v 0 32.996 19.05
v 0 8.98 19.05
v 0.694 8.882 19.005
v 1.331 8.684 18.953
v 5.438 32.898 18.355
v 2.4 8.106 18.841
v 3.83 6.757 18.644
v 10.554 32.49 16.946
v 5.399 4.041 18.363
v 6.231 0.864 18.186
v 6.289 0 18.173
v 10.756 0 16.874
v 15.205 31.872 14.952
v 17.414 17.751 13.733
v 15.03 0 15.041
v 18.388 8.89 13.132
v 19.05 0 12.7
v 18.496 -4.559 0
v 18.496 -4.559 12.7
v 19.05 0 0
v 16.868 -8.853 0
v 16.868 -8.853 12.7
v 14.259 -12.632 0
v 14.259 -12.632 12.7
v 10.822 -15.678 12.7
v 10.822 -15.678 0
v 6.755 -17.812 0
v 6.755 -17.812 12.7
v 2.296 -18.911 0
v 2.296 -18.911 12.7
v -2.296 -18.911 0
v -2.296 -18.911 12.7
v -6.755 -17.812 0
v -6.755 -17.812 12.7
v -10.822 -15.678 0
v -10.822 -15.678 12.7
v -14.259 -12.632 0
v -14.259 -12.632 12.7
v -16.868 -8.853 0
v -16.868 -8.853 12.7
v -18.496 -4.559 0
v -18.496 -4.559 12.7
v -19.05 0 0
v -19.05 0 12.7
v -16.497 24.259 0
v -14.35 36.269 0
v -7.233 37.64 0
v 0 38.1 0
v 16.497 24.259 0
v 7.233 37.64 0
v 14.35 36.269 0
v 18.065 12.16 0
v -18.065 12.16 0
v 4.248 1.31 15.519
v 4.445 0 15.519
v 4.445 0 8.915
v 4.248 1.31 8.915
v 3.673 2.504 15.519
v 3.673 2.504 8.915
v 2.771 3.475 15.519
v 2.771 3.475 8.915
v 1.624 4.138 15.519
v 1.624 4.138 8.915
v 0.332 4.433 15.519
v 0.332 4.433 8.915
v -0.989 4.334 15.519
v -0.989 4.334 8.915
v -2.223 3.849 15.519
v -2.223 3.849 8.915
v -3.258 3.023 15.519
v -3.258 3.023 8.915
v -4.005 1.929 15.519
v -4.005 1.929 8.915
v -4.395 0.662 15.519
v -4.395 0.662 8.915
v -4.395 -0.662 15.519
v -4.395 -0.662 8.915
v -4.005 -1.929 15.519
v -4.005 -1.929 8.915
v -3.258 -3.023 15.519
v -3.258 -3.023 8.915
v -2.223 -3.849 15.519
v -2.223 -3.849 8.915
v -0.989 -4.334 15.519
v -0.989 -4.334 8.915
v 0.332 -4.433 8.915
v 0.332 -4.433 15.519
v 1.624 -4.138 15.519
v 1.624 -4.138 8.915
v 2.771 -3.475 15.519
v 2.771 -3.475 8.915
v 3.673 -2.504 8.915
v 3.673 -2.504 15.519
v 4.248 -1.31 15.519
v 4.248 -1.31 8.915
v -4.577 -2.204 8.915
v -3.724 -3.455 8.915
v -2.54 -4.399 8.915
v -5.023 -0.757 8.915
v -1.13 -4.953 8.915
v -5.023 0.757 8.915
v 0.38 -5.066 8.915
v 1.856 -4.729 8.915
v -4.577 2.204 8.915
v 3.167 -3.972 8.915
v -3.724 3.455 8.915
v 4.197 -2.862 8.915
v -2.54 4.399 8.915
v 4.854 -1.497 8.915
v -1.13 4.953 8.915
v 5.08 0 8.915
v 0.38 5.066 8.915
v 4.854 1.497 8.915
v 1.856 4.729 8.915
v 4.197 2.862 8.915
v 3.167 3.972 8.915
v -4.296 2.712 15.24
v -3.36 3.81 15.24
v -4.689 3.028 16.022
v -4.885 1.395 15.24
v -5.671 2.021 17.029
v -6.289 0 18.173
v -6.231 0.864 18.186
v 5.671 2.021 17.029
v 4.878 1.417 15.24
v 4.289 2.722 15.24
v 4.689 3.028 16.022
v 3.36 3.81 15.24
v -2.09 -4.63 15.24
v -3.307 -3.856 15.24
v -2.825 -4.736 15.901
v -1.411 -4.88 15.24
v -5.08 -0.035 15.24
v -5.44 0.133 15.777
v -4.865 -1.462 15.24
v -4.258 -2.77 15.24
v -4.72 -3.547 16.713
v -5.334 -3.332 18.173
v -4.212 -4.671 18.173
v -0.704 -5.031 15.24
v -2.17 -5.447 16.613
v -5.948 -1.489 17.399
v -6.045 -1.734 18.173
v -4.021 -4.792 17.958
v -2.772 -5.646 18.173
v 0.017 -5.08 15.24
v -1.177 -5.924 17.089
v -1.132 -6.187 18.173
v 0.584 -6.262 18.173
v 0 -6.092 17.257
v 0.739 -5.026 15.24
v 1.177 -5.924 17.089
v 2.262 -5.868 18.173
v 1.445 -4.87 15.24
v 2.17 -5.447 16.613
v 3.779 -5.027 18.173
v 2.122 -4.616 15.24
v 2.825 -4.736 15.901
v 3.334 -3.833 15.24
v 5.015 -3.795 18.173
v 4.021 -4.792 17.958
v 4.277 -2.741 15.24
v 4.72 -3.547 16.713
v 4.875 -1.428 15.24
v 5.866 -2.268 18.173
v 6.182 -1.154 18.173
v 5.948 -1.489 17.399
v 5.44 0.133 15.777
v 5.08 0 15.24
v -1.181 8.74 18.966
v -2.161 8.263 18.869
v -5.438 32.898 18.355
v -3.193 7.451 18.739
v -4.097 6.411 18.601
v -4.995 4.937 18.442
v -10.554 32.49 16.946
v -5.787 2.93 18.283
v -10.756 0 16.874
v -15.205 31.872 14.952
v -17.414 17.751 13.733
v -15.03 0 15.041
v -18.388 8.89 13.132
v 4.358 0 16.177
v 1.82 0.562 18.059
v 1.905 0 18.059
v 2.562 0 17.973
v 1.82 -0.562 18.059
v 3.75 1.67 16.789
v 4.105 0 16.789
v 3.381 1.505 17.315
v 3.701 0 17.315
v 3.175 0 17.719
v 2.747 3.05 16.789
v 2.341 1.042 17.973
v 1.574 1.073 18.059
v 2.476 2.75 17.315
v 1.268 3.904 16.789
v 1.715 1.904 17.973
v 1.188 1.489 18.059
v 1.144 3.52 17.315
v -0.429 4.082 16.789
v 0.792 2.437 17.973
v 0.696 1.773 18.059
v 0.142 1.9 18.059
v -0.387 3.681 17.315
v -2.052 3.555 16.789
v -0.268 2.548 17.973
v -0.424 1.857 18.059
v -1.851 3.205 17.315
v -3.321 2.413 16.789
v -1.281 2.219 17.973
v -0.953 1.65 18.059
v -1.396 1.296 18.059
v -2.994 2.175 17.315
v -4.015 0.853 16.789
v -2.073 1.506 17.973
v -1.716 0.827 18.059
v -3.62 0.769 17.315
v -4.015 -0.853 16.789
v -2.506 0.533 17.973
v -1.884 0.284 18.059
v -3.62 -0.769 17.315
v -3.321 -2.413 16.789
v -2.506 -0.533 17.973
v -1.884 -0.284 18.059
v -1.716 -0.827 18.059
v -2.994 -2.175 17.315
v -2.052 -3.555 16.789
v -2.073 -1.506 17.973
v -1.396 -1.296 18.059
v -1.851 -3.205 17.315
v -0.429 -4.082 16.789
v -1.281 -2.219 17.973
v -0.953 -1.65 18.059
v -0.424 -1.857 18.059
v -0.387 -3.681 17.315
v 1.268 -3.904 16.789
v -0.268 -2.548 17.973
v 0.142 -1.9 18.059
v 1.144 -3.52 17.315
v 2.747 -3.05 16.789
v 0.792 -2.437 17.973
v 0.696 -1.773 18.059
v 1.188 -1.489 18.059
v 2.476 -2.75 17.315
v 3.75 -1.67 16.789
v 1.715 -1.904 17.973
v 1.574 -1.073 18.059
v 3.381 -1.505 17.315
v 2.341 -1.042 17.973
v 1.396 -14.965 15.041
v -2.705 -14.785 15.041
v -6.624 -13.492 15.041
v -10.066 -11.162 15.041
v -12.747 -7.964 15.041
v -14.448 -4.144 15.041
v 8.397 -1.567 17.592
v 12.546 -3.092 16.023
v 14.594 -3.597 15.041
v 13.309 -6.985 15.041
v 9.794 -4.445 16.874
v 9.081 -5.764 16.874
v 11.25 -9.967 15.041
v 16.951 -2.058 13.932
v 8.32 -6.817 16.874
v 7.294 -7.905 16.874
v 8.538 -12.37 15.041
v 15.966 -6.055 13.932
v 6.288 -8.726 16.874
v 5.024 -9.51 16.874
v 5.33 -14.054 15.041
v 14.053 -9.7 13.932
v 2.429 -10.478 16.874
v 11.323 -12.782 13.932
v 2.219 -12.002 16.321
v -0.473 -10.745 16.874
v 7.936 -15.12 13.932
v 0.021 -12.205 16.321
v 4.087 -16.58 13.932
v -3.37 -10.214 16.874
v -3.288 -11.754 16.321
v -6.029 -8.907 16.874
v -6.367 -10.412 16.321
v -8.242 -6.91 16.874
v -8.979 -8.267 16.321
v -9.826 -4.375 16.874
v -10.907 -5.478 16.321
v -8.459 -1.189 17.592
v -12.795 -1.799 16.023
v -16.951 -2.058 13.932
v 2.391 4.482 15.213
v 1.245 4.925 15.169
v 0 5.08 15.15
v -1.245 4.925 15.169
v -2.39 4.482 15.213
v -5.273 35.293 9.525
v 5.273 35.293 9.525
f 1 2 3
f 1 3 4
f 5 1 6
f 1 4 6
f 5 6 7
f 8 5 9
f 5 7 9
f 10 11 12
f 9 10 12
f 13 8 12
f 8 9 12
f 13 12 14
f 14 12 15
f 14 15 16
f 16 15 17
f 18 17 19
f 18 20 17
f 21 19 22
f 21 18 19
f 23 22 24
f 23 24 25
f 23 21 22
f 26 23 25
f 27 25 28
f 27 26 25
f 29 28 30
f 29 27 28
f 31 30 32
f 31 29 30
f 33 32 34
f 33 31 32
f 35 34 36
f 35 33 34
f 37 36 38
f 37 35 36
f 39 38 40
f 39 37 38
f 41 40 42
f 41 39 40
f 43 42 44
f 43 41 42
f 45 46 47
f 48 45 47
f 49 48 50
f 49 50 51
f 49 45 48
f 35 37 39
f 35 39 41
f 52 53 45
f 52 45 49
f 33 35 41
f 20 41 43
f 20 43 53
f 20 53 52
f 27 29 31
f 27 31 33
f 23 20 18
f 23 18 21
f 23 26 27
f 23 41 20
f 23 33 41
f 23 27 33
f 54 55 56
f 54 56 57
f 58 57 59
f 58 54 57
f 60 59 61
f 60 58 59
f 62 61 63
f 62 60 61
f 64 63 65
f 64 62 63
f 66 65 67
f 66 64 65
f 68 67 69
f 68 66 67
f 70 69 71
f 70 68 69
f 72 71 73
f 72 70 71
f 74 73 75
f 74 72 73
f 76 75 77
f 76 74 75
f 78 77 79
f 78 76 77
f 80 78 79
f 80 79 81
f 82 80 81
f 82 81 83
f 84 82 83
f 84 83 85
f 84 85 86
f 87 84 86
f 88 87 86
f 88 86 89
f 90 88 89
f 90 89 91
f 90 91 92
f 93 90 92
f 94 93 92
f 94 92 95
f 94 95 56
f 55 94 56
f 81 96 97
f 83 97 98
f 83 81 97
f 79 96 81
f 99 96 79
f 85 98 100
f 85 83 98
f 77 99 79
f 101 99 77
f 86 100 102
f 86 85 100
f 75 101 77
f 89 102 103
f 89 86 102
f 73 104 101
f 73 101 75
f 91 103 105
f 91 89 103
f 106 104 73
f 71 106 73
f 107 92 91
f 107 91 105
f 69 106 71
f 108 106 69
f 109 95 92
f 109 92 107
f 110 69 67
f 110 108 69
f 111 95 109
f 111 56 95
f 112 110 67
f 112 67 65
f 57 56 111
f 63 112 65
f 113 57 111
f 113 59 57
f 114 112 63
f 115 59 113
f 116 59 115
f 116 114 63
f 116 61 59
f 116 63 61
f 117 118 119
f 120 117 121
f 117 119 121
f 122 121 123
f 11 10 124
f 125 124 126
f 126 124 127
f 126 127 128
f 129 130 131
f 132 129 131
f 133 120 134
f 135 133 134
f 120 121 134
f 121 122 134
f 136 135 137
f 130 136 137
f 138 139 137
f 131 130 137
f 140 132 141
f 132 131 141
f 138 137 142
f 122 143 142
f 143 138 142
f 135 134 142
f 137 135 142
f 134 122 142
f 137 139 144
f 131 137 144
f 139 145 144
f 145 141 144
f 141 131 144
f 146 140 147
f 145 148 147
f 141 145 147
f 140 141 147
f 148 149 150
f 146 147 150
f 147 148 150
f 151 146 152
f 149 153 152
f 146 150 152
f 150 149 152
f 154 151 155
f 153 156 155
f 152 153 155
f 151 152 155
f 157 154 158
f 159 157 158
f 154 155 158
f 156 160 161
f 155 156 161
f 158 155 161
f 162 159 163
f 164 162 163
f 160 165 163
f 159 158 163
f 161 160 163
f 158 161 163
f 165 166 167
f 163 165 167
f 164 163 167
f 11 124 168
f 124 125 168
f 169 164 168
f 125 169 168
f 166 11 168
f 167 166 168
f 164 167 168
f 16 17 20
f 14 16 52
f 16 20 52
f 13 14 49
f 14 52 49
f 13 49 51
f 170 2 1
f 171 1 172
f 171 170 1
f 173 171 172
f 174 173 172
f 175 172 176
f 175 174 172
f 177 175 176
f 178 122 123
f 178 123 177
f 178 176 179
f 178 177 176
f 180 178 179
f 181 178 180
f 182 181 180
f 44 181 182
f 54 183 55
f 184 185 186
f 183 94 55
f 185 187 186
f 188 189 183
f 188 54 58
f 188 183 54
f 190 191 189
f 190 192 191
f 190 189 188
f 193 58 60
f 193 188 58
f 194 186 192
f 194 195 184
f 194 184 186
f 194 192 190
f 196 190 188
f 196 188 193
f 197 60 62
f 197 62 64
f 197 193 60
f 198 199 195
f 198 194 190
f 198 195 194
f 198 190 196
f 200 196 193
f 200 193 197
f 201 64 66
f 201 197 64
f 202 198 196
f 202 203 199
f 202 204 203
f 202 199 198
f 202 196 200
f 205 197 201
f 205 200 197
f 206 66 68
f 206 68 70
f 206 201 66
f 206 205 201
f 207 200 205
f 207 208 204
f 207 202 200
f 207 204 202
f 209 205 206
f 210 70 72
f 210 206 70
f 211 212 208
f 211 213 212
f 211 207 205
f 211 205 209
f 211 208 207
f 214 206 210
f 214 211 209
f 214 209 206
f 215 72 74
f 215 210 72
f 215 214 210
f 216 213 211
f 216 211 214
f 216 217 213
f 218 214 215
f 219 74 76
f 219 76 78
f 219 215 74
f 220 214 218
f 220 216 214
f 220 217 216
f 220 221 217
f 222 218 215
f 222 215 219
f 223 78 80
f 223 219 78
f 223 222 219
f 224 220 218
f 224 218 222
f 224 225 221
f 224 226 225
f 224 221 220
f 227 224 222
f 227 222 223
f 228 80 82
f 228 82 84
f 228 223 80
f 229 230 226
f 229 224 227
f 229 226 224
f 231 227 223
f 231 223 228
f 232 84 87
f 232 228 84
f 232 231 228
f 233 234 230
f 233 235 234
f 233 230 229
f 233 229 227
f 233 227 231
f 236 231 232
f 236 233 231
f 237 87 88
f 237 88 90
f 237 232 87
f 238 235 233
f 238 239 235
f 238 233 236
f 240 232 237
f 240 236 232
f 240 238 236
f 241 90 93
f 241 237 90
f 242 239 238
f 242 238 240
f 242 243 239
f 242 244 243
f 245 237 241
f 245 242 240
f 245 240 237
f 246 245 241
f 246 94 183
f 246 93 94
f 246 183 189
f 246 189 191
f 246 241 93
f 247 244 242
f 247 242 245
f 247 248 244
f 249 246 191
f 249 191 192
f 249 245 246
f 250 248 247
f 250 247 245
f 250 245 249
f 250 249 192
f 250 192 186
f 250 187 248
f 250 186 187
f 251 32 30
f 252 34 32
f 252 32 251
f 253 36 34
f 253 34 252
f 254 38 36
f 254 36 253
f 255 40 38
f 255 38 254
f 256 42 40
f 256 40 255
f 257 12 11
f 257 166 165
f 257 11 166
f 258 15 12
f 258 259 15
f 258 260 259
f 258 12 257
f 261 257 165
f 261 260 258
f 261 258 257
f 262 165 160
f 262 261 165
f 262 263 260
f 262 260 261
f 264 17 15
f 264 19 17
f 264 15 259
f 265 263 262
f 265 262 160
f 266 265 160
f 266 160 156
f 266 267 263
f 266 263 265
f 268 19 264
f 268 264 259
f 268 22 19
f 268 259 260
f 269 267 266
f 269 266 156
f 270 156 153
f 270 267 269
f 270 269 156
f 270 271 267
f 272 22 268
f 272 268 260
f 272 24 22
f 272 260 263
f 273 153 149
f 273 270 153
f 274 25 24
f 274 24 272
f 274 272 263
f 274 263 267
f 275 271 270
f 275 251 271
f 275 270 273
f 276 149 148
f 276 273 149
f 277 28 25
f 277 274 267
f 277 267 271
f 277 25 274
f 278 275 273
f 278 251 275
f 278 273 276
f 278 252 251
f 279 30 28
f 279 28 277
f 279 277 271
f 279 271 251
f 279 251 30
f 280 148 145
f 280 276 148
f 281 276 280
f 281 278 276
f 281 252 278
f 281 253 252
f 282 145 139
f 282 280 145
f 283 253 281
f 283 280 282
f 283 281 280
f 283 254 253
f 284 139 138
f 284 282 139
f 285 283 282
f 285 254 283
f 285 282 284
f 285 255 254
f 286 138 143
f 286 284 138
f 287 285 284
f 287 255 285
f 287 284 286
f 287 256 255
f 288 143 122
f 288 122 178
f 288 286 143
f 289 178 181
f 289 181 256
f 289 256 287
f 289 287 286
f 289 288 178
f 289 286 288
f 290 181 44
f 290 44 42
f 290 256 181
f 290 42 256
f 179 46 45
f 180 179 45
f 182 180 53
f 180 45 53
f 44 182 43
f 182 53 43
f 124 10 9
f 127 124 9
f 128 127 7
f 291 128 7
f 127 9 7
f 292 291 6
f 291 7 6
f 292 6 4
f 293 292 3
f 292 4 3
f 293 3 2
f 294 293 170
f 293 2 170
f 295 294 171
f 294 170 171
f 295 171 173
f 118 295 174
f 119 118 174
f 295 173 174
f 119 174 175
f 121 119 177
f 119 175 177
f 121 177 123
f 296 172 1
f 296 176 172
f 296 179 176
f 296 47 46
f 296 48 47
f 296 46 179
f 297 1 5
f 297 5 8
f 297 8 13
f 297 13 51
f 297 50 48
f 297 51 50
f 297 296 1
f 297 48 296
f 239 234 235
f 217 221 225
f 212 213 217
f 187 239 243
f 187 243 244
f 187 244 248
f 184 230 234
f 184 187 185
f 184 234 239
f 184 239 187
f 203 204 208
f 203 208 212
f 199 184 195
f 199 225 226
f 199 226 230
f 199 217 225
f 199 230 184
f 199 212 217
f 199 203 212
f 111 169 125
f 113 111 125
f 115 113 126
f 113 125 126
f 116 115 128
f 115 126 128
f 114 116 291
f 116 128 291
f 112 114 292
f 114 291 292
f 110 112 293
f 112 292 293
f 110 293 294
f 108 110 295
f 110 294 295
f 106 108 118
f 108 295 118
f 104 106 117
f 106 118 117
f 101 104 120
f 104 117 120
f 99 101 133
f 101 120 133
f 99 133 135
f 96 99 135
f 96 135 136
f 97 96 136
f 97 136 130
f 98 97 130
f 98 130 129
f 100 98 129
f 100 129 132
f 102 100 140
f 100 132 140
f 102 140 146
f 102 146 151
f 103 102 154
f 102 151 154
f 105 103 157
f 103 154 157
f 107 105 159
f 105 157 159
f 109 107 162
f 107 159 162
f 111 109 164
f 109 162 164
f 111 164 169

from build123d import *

# Parameters (mm, degrees)
F1_ANGLE_BACK  = 90
F1_ANGLE       = 180
F2_DEPTH       = 38.1
F4_DEPTH       = 19.051
F6_ANGLE_BACK  = 90
F6_ANGLE       = 180
F10_R          = 5.08
F10_R_2        = 4.445
F11_DEPTH      = 6.35
F12_DEPTH      = 2.794
F12_DEPTH_BACK = 6.35
F13_R          = 2.54


with BuildPart() as f1:
    # F0 (on Right) → F1 (revolve)
    with BuildSketch(Plane.YZ, mode=Mode.PRIVATE) as f1_sk:
        with BuildLine():
            Line((-19.05, 0), (0, 0))
            Line((0, 0), (0, 12.7))
            Line((0, 12.7), (0, 19.05))
            ThreePointArc((0, 19.05), (-9.950869572, 17.152608716), (-19.05, 12.7))
            Line((-19.05, 12.7), (-19.05, 0))
        make_face()
    revolve(f1_sk.sketch.rotate(Axis((0, 0, 6.35), (0, 0, -1)), -F1_ANGLE_BACK), axis=Axis((0, 0, 6.35), (0, 0, -1)), revolution_arc=F1_ANGLE)

    # F2 (add): a face of the model
    f2_faces = [f1.faces().sort_by_distance(p)[0] for p in [
        (0, 0, 8.5143309126),
    ]]
    extrude(f2_faces, amount=F2_DEPTH)

    # F3 (on face) → F4 (cut, through all)
    with BuildSketch(Plane(origin=(0, 0, 0), x_dir=(1, 0, 0), z_dir=(0, 0, -1))):
        with BuildLine():
            ThreePointArc((19.05, 0), (17.2317314868, -19.1462308649), (13.97, -38.1))
            Line((13.97, -38.1), (19.05, -38.1))
            Line((19.05, -38.1), (19.05, 0))
        make_face()
        with BuildLine():
            Line((-19.05, -38.1), (-13.97, -38.1))
            ThreePointArc((-13.97, -38.1), (-17.2317314868, -19.1462308649), (-19.05, 0))
            Line((-19.05, 0), (-19.05, -38.1))
        make_face()
    extrude(amount=-F4_DEPTH, mode=Mode.SUBTRACT)

    # F5 (on Right) → F6 (revolve, cut)
    with BuildSketch(Plane.YZ, mode=Mode.PRIVATE) as f6_sk:
        Polygon((32.9955678842, 19.05), (38.1, 0), (45.72, 0), (45.72, 19.05), (38.1, 19.05), align=None)
    revolve(f6_sk.sketch.rotate(Axis((0, -19.05, 6.35), (0, 0, -1)), -F6_ANGLE_BACK), axis=Axis((0, -19.05, 6.35), (0, 0, -1)), revolution_arc=F6_ANGLE, mode=Mode.SUBTRACT)

    # F7 (on Right) → F8 (revolve, cut)
    with BuildSketch(Plane.YZ):
        with BuildLine():
            ThreePointArc((-4.4901280605, 14.5598719395), (0, 12.7), (4.4901280605, 14.5598719395))
            Line((4.4901280605, 14.5598719395), (19.18810552, 29.2578493989))
            Line((19.18810552, 29.2578493989), (14.6979774594, 33.7479774594))
            Line((14.6979774594, 33.7479774594), (-4.4901280605, 14.5598719395))
        make_face()
    revolve(axis=Axis((0, 17.5408982918, 36.5908982918), (0, 0.7071067812, 0.7071067812)), mode=Mode.SUBTRACT)

    # F10 (on offset) → F11 (cut)
    with BuildSketch(Plane.XY.offset(15.2654)):
        Circle(F10_R)
        Circle(F10_R_2, mode=Mode.SUBTRACT)
        Circle(F10_R_2)
    extrude(amount=-F11_DEPTH, mode=Mode.SUBTRACT)

    # F10 (on offset) → F12 (join, two sides)
    with BuildSketch(Plane.XY.offset(15.2654)) as f12_sk:
        Circle(F10_R_2)
    extrude(amount=F12_DEPTH)
    extrude(f12_sk.sketch, amount=-F12_DEPTH_BACK)

    # F13
    f13_edges = [f1.edges().sort_by_distance(p)[0] for p in [
        (-4.445, 0, 18.0594),
    ]]
    fillet(f13_edges, radius=F13_R)


solid = f1.part
